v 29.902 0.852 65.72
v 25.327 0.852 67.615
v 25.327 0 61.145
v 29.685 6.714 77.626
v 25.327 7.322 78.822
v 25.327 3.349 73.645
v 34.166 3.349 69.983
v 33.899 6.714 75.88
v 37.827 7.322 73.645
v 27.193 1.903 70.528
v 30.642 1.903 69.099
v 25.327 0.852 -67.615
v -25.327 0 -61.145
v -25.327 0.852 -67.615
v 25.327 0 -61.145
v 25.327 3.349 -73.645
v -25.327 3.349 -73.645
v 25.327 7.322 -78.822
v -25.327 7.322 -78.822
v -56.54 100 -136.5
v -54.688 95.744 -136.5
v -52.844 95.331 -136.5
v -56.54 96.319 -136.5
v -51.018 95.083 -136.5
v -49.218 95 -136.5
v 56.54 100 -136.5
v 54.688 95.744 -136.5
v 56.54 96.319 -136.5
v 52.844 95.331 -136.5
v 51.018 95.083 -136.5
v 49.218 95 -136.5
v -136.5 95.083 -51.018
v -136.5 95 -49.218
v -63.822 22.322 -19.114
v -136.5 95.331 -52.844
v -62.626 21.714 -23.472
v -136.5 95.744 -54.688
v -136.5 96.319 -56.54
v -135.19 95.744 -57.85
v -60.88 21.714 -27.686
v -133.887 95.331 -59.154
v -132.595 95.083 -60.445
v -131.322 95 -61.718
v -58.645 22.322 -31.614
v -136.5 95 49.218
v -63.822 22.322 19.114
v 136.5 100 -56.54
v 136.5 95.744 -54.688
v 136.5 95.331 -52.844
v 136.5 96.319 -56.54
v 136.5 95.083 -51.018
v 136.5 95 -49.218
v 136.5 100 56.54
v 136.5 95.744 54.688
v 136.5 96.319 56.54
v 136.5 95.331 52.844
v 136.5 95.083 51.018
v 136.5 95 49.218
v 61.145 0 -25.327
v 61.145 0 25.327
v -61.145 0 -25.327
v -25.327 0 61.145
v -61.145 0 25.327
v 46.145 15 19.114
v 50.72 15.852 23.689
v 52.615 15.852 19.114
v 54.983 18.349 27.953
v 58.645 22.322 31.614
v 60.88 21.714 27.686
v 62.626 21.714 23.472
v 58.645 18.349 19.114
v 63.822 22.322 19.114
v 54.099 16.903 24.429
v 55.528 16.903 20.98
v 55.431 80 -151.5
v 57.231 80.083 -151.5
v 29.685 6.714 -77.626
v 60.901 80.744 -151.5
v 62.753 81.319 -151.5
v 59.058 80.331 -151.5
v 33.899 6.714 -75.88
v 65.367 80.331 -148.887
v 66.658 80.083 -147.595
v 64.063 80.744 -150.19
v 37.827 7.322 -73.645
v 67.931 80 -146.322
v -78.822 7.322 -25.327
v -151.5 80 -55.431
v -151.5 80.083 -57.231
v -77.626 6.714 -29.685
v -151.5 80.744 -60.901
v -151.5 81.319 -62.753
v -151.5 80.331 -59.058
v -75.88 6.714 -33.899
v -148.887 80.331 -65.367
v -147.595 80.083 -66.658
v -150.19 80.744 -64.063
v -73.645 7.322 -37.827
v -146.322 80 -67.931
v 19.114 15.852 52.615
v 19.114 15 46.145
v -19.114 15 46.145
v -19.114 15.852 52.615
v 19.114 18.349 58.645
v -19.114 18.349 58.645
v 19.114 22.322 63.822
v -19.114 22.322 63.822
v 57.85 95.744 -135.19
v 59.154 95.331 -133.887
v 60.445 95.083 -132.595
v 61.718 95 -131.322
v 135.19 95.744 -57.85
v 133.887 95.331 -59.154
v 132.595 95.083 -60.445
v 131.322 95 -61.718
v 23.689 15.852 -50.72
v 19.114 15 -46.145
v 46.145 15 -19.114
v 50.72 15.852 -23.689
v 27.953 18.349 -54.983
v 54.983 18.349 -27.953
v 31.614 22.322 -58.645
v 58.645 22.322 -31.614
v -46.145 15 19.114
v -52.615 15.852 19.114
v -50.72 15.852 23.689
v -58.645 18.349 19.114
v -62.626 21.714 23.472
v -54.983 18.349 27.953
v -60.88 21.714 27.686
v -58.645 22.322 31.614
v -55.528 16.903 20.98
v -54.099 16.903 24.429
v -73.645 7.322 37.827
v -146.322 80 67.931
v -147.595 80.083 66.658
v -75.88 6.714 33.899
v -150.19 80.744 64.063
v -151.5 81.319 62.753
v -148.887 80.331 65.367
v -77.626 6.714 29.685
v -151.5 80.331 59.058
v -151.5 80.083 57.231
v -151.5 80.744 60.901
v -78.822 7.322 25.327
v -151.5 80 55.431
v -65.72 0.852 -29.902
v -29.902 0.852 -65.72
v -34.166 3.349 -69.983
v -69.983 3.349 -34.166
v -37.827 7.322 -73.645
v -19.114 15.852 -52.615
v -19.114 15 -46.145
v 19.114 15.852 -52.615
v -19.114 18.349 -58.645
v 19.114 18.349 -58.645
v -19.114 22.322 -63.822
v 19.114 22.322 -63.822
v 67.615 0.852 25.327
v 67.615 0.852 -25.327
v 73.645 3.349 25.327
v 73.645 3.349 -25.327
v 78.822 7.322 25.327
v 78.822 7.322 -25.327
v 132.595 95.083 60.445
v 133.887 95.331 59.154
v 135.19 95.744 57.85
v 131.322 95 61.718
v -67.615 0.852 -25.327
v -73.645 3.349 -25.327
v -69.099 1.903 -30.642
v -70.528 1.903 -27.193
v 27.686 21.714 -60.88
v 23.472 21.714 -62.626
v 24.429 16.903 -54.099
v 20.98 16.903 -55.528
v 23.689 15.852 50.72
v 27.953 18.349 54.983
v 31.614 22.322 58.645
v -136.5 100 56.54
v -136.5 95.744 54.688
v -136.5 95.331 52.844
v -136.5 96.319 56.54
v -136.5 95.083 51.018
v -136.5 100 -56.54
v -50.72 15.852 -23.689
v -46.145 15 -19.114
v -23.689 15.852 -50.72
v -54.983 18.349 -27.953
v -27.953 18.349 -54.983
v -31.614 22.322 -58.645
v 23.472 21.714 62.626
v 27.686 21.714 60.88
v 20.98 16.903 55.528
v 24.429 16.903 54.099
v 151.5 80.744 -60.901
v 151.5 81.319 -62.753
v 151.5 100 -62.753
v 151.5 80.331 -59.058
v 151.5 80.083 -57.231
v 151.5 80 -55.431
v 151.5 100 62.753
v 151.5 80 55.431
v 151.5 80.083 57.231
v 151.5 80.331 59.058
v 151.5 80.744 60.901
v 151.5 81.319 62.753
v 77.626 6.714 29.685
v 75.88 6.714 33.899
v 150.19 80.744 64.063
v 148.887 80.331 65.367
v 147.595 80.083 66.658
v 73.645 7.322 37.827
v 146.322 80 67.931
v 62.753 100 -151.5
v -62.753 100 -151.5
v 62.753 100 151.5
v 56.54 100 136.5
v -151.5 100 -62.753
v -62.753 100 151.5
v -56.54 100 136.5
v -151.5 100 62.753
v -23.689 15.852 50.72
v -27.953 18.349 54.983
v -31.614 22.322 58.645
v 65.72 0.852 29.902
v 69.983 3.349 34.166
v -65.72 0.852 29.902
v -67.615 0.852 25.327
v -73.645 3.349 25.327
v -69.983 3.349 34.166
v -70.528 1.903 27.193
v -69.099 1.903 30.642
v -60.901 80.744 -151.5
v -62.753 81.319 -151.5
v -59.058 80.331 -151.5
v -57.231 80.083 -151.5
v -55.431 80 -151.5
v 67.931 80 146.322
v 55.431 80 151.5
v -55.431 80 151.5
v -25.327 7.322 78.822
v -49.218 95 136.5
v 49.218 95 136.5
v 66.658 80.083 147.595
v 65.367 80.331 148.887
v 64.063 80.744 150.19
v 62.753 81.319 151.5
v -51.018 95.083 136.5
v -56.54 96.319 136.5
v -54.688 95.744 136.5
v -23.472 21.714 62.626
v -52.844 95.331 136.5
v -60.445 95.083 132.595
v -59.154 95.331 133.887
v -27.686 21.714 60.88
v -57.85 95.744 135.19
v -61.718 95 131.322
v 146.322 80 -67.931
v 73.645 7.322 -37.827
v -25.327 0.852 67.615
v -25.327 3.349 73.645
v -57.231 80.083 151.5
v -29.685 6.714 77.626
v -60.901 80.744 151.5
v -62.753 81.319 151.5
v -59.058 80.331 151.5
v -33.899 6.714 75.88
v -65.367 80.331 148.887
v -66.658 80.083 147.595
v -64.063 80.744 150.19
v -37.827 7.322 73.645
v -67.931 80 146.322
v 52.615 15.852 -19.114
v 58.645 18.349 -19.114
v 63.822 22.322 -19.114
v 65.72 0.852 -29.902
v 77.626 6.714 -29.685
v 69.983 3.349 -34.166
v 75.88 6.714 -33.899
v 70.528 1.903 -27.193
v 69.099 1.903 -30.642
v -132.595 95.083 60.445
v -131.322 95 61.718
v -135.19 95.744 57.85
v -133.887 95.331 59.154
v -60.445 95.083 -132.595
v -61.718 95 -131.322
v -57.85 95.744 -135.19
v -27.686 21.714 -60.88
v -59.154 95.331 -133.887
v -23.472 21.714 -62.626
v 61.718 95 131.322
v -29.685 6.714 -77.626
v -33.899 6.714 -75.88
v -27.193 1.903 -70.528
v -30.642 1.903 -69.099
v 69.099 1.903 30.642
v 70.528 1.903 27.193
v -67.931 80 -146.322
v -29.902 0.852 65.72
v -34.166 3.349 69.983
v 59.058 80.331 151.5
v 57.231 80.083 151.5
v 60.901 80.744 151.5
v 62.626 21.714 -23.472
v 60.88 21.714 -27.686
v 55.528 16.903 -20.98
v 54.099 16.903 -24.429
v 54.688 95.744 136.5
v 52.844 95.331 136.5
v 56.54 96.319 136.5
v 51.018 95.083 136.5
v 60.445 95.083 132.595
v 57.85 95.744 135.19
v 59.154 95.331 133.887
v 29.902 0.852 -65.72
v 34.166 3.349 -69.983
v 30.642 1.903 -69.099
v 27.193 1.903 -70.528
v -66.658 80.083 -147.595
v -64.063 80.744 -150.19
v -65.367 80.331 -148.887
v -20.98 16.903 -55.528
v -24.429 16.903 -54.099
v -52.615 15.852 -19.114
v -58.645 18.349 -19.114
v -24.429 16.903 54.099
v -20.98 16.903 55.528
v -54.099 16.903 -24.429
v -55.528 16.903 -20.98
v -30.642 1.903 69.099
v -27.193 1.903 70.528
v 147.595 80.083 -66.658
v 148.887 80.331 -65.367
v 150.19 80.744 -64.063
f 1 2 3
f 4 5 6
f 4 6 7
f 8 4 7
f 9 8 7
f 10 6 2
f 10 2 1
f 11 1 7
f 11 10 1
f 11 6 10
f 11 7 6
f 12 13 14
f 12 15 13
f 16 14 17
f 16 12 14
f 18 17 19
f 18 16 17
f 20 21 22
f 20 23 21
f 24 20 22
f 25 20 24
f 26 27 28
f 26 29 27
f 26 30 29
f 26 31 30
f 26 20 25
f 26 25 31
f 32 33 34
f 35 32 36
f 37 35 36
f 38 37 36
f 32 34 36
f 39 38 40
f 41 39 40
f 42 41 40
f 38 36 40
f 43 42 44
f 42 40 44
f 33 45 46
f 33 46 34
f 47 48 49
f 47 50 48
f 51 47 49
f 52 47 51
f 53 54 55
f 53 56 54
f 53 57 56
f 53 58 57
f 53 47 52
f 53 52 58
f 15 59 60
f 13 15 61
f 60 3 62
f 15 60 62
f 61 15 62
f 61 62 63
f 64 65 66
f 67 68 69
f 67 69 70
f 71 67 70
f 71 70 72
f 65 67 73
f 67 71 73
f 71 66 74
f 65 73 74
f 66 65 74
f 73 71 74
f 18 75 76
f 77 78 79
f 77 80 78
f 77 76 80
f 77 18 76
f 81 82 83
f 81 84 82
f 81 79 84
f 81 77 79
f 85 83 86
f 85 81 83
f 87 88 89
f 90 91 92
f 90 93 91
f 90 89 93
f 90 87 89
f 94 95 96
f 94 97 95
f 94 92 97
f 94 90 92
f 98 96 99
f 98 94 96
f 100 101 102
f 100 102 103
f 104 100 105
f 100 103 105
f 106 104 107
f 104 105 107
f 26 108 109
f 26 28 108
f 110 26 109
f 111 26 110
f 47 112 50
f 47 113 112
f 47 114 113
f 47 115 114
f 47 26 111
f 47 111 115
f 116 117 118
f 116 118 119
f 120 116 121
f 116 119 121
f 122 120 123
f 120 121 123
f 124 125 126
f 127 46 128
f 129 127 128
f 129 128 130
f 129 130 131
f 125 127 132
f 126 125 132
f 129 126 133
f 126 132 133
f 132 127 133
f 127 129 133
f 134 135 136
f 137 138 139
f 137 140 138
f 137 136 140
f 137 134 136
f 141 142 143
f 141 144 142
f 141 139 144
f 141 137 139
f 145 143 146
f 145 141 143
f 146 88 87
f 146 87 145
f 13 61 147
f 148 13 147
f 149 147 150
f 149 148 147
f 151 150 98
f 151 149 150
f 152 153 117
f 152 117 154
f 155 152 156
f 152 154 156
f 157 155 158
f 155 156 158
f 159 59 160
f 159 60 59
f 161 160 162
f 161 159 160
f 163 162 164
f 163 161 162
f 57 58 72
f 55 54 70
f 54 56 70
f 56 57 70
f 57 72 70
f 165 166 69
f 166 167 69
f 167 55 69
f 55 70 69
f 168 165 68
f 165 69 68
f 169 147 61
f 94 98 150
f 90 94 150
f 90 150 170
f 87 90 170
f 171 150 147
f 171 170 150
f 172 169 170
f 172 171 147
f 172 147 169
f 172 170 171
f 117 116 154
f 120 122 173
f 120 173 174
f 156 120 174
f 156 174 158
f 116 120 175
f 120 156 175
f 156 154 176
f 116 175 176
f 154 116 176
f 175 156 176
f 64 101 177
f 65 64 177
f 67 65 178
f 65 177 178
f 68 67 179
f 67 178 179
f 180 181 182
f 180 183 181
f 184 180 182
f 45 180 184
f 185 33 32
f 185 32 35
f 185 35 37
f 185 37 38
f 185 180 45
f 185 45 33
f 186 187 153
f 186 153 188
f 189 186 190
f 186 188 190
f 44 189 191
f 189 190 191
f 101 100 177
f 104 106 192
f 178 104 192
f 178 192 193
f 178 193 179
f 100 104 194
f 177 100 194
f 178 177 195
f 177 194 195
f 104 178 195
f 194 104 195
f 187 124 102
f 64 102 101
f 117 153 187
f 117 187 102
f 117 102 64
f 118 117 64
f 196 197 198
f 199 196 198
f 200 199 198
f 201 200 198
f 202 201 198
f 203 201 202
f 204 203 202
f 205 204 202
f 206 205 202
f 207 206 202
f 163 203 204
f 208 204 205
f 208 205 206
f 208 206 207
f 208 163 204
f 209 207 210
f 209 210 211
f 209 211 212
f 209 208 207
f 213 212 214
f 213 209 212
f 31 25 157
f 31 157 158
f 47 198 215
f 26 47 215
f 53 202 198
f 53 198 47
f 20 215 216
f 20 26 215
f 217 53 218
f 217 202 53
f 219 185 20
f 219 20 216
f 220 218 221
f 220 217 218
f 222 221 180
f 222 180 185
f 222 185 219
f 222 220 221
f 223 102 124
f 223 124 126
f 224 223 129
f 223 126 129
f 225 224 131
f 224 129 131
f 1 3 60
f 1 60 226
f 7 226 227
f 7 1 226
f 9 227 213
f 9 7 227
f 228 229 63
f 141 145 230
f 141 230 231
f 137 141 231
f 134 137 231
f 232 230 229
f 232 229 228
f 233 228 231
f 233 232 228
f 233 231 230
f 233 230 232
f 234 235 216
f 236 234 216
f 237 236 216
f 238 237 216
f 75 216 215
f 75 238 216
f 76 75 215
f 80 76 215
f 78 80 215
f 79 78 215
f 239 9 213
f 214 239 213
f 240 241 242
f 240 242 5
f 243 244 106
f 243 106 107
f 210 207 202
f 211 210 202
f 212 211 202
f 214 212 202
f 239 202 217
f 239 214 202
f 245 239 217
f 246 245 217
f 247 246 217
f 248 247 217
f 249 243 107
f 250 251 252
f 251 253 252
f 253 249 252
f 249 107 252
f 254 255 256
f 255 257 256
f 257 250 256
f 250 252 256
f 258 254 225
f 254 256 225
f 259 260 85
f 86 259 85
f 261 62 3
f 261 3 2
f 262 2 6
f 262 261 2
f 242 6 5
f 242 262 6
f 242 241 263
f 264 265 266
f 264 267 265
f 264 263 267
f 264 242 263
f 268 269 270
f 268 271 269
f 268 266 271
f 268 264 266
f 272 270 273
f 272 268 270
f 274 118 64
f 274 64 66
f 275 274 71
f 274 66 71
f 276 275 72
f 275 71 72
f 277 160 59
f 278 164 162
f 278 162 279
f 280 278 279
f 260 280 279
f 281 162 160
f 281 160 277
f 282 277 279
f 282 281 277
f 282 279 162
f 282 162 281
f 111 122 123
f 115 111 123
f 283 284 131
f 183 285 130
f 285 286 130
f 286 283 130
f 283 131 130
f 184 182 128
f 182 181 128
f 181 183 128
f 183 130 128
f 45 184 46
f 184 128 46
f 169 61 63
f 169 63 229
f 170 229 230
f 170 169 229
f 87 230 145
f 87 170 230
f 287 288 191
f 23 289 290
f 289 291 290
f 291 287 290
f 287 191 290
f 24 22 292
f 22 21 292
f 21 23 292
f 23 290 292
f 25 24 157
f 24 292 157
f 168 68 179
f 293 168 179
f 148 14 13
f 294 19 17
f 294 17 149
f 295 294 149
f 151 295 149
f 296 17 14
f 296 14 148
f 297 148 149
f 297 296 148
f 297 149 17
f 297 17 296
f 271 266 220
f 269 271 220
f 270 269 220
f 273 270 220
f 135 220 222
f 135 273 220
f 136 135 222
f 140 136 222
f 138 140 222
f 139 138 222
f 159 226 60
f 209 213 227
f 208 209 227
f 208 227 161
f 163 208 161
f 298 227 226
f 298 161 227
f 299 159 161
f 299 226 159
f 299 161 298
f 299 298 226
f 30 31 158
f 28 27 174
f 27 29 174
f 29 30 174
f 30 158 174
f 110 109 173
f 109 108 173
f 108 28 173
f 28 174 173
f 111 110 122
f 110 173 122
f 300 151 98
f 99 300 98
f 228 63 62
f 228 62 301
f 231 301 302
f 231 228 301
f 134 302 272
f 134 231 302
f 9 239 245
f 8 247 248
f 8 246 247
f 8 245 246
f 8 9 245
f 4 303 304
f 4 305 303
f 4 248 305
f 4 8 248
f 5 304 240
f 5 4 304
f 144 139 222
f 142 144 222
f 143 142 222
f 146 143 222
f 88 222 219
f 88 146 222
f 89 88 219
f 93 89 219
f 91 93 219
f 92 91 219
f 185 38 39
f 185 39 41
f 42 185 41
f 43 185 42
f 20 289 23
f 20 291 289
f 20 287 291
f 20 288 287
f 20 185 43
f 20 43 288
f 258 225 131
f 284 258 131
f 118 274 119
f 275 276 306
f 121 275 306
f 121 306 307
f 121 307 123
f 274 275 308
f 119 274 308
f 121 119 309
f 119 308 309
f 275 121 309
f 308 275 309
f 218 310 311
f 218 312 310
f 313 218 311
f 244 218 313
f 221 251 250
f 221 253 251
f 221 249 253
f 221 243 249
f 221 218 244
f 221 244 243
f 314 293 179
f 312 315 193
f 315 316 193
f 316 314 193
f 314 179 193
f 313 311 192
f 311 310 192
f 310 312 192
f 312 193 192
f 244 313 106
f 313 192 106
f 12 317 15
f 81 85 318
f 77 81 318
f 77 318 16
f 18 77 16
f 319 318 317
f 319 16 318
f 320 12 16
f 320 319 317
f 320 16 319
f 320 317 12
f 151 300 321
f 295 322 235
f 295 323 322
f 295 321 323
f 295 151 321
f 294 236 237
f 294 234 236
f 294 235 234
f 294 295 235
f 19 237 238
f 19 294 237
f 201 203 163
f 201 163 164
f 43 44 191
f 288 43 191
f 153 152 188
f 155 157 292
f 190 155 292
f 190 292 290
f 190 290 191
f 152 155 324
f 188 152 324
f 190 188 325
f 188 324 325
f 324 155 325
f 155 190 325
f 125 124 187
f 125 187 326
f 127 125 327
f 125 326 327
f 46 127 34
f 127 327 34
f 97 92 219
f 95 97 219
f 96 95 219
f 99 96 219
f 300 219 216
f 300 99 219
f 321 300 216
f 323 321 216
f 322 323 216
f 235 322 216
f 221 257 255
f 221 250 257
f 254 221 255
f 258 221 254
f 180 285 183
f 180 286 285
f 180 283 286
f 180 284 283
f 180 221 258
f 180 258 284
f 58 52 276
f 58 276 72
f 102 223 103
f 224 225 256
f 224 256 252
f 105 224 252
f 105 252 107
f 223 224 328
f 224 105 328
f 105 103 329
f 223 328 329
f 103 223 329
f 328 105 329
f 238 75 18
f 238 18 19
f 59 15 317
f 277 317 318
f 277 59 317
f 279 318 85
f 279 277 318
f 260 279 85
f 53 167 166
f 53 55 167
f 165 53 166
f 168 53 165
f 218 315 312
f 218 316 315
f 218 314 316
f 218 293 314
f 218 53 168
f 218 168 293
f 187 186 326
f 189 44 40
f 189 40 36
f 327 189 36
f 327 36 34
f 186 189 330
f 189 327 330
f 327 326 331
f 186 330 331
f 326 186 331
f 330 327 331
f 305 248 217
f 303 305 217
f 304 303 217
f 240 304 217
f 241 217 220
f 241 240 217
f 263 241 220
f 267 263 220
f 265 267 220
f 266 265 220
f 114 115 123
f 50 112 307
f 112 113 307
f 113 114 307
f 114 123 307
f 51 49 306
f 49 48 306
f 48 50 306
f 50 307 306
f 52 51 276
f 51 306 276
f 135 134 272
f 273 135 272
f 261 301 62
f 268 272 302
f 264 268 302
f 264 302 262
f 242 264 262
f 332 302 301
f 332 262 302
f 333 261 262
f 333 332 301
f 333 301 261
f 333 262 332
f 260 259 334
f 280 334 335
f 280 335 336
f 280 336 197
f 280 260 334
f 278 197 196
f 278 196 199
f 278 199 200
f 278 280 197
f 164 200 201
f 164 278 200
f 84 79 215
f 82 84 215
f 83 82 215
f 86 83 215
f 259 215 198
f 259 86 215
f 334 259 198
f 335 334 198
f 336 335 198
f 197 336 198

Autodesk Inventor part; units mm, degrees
ref_plane "YZ Plane" through (0, 0, 0) normal (1, 0, 0) x (0, 1, 0)
ref_plane "XZ Plane" through (0, 0, 0) normal (0, 1, 0) x (-1, 0, 0)
ref_plane "XY Plane" through (0, 0, 0) normal (0, 0, 1) x (1, 0, 0)
sketch "Sketch1" plane through (0, 0, 0) normal (0, 1, 0) x (-1, 0, 0)
  line L0 (-62.7534, -151.5) -> (-151.5, -62.7534)
  line L1 (-151.5, -62.7534) -> (-151.5, 62.7534)
  line L2 (-151.5, 62.7534) -> (-62.7534, 151.5)
  line L3 (-62.7534, 151.5) -> (62.7534, 151.5)
  line L4 (62.7534, 151.5) -> (151.5, 62.7534)
  line L5 (151.5, 62.7534) -> (151.5, -62.7534)
  line L6 (151.5, -62.7534) -> (62.7534, -151.5)
  line L7 (62.7534, -151.5) -> (-62.7534, -151.5)
  point P0 (0, 0)
  point P1 (0, 0)
  dimension "d0" = 303
extrude "Extrusion1" add sketch "Sketch1" along normal blind 100
sketch "Sketch2" plane through (0, 100, 0) normal (0, 1, 0) x (1, 0, 0)
  line L0 (-136.5, 56.5402) -> (-56.5402, 136.5)
  line L1 (-56.5402, 136.5) -> (56.5402, 136.5)
  line L2 (56.5402, 136.5) -> (136.5, 56.5402)
  line L3 (136.5, 56.5402) -> (136.5, -56.5402)
  line L4 (136.5, -56.5402) -> (56.5402, -136.5)
  line L5 (56.5402, -136.5) -> (-56.5402, -136.5)
  line L6 (-56.5402, -136.5) -> (-136.5, -56.5402)
  line L7 (-136.5, -56.5402) -> (-136.5, 56.5402)
  point P0 (0, 0)
  point P1 (0, 0)
  dimension "d3" = 273
extrude "Extrusion2" cut sketch "Sketch2" against normal blind 85
chamfer "Chamfer1" distance 80 angle 45 8 edges at (0, 15, 136.5) (96.5201, 15, 96.5201) (-96.5201, 15, 96.5201) (136.5, 15, 0) (96.5201, 15, -96.5201) (0, 15, -136.5) (-96.5201, 15, -96.5201) (-136.5, 15, 0)
chamfer "Chamfer2" distance 80 angle 45 8 edges at (-107.1267, 0, -107.1267) (0, 0, -151.5) (-151.5, 0, 0) (107.1267, 0, -107.1267) (151.5, 0, 0) (107.1267, 0, 107.1267) (0, 0, 151.5) (-107.1267, 0, 107.1267)
fillet "Fillet1" radius 25 16 edges at (46.1848, 40, 111.5) (111.5, 40, 46.1848) (111.5, 40, -46.1848) (-46.1848, 40, 111.5) (-111.5, 40, 46.1848) (46.1848, 40, -111.5) (-46.1848, 40, -111.5) (-111.5, 40, -46.1848) (-50.5581, 0, -50.5581) (0, 0, -71.5) (-71.5, 0, 0) (-50.5581, 0, 50.5581) (0, 0, 71.5) (50.5581, 0, 50.5581) (71.5, 0, 0) (50.5581, 0, -50.5581)
fillet "Fillet2" radius 25 16 edges at (39.9716, 55, 96.5) (96.5, 55, 39.9716) (96.5, 55, -39.9716) (-39.9716, 55, 96.5) (39.9716, 55, -96.5) (-39.9716, 55, -96.5) (-96.5, 55, -39.9716) (-96.5, 55, 39.9716) (-56.5, 15, 0) (-39.9515, 15, 39.9515) (-39.9515, 15, -39.9515) (0, 15, -56.5) (0, 15, 56.5) (39.9515, 15, 39.9515) (56.5, 15, 0) (39.9515, 15, -39.9515)
sketch "Sketch3" plane through (62.7534, 81.319, -151.5) normal (0.7071, 0, -0.7071) x (-0.7071, 0, -0.7071)
  circle A0 centre (-10, 7.5) radius 2
  point P0 (-62.7534, -81.319)
  dimension "d14" = 4
sketch "Sketch4" plane through (-62.7534, 81.319, 151.5) normal (-0.7071, 0, 0.7071) x (0.7071, 0, 0.7071)
  circle A0 centre (-115, 7.5) radius 2
  point P0 (-62.7534, -81.319)
  dimension "d15" = 4
sketch "Sketch5" plane through (62.7534, 81.319, -151.5) normal (0.7071, 0, -0.7071) x (-0.7071, 0, -0.7071)
  circle A0 centre (-62.755, 9.34) radius 2
  point P0 (-62.7534, -81.319)
  dimension "d16" = 4
sketch "Sketch6" plane through (-62.7534, 81.319, 151.5) normal (-0.7071, 0, 0.7071) x (0.7071, 0, 0.7071)
  circle A0 centre (-62.755, 9.34) radius 2
  point P0 (-62.7534, -81.319)
  dimension "d17" = 4
properties part number "trail 6.1" material "PVC, Unplasticized"
